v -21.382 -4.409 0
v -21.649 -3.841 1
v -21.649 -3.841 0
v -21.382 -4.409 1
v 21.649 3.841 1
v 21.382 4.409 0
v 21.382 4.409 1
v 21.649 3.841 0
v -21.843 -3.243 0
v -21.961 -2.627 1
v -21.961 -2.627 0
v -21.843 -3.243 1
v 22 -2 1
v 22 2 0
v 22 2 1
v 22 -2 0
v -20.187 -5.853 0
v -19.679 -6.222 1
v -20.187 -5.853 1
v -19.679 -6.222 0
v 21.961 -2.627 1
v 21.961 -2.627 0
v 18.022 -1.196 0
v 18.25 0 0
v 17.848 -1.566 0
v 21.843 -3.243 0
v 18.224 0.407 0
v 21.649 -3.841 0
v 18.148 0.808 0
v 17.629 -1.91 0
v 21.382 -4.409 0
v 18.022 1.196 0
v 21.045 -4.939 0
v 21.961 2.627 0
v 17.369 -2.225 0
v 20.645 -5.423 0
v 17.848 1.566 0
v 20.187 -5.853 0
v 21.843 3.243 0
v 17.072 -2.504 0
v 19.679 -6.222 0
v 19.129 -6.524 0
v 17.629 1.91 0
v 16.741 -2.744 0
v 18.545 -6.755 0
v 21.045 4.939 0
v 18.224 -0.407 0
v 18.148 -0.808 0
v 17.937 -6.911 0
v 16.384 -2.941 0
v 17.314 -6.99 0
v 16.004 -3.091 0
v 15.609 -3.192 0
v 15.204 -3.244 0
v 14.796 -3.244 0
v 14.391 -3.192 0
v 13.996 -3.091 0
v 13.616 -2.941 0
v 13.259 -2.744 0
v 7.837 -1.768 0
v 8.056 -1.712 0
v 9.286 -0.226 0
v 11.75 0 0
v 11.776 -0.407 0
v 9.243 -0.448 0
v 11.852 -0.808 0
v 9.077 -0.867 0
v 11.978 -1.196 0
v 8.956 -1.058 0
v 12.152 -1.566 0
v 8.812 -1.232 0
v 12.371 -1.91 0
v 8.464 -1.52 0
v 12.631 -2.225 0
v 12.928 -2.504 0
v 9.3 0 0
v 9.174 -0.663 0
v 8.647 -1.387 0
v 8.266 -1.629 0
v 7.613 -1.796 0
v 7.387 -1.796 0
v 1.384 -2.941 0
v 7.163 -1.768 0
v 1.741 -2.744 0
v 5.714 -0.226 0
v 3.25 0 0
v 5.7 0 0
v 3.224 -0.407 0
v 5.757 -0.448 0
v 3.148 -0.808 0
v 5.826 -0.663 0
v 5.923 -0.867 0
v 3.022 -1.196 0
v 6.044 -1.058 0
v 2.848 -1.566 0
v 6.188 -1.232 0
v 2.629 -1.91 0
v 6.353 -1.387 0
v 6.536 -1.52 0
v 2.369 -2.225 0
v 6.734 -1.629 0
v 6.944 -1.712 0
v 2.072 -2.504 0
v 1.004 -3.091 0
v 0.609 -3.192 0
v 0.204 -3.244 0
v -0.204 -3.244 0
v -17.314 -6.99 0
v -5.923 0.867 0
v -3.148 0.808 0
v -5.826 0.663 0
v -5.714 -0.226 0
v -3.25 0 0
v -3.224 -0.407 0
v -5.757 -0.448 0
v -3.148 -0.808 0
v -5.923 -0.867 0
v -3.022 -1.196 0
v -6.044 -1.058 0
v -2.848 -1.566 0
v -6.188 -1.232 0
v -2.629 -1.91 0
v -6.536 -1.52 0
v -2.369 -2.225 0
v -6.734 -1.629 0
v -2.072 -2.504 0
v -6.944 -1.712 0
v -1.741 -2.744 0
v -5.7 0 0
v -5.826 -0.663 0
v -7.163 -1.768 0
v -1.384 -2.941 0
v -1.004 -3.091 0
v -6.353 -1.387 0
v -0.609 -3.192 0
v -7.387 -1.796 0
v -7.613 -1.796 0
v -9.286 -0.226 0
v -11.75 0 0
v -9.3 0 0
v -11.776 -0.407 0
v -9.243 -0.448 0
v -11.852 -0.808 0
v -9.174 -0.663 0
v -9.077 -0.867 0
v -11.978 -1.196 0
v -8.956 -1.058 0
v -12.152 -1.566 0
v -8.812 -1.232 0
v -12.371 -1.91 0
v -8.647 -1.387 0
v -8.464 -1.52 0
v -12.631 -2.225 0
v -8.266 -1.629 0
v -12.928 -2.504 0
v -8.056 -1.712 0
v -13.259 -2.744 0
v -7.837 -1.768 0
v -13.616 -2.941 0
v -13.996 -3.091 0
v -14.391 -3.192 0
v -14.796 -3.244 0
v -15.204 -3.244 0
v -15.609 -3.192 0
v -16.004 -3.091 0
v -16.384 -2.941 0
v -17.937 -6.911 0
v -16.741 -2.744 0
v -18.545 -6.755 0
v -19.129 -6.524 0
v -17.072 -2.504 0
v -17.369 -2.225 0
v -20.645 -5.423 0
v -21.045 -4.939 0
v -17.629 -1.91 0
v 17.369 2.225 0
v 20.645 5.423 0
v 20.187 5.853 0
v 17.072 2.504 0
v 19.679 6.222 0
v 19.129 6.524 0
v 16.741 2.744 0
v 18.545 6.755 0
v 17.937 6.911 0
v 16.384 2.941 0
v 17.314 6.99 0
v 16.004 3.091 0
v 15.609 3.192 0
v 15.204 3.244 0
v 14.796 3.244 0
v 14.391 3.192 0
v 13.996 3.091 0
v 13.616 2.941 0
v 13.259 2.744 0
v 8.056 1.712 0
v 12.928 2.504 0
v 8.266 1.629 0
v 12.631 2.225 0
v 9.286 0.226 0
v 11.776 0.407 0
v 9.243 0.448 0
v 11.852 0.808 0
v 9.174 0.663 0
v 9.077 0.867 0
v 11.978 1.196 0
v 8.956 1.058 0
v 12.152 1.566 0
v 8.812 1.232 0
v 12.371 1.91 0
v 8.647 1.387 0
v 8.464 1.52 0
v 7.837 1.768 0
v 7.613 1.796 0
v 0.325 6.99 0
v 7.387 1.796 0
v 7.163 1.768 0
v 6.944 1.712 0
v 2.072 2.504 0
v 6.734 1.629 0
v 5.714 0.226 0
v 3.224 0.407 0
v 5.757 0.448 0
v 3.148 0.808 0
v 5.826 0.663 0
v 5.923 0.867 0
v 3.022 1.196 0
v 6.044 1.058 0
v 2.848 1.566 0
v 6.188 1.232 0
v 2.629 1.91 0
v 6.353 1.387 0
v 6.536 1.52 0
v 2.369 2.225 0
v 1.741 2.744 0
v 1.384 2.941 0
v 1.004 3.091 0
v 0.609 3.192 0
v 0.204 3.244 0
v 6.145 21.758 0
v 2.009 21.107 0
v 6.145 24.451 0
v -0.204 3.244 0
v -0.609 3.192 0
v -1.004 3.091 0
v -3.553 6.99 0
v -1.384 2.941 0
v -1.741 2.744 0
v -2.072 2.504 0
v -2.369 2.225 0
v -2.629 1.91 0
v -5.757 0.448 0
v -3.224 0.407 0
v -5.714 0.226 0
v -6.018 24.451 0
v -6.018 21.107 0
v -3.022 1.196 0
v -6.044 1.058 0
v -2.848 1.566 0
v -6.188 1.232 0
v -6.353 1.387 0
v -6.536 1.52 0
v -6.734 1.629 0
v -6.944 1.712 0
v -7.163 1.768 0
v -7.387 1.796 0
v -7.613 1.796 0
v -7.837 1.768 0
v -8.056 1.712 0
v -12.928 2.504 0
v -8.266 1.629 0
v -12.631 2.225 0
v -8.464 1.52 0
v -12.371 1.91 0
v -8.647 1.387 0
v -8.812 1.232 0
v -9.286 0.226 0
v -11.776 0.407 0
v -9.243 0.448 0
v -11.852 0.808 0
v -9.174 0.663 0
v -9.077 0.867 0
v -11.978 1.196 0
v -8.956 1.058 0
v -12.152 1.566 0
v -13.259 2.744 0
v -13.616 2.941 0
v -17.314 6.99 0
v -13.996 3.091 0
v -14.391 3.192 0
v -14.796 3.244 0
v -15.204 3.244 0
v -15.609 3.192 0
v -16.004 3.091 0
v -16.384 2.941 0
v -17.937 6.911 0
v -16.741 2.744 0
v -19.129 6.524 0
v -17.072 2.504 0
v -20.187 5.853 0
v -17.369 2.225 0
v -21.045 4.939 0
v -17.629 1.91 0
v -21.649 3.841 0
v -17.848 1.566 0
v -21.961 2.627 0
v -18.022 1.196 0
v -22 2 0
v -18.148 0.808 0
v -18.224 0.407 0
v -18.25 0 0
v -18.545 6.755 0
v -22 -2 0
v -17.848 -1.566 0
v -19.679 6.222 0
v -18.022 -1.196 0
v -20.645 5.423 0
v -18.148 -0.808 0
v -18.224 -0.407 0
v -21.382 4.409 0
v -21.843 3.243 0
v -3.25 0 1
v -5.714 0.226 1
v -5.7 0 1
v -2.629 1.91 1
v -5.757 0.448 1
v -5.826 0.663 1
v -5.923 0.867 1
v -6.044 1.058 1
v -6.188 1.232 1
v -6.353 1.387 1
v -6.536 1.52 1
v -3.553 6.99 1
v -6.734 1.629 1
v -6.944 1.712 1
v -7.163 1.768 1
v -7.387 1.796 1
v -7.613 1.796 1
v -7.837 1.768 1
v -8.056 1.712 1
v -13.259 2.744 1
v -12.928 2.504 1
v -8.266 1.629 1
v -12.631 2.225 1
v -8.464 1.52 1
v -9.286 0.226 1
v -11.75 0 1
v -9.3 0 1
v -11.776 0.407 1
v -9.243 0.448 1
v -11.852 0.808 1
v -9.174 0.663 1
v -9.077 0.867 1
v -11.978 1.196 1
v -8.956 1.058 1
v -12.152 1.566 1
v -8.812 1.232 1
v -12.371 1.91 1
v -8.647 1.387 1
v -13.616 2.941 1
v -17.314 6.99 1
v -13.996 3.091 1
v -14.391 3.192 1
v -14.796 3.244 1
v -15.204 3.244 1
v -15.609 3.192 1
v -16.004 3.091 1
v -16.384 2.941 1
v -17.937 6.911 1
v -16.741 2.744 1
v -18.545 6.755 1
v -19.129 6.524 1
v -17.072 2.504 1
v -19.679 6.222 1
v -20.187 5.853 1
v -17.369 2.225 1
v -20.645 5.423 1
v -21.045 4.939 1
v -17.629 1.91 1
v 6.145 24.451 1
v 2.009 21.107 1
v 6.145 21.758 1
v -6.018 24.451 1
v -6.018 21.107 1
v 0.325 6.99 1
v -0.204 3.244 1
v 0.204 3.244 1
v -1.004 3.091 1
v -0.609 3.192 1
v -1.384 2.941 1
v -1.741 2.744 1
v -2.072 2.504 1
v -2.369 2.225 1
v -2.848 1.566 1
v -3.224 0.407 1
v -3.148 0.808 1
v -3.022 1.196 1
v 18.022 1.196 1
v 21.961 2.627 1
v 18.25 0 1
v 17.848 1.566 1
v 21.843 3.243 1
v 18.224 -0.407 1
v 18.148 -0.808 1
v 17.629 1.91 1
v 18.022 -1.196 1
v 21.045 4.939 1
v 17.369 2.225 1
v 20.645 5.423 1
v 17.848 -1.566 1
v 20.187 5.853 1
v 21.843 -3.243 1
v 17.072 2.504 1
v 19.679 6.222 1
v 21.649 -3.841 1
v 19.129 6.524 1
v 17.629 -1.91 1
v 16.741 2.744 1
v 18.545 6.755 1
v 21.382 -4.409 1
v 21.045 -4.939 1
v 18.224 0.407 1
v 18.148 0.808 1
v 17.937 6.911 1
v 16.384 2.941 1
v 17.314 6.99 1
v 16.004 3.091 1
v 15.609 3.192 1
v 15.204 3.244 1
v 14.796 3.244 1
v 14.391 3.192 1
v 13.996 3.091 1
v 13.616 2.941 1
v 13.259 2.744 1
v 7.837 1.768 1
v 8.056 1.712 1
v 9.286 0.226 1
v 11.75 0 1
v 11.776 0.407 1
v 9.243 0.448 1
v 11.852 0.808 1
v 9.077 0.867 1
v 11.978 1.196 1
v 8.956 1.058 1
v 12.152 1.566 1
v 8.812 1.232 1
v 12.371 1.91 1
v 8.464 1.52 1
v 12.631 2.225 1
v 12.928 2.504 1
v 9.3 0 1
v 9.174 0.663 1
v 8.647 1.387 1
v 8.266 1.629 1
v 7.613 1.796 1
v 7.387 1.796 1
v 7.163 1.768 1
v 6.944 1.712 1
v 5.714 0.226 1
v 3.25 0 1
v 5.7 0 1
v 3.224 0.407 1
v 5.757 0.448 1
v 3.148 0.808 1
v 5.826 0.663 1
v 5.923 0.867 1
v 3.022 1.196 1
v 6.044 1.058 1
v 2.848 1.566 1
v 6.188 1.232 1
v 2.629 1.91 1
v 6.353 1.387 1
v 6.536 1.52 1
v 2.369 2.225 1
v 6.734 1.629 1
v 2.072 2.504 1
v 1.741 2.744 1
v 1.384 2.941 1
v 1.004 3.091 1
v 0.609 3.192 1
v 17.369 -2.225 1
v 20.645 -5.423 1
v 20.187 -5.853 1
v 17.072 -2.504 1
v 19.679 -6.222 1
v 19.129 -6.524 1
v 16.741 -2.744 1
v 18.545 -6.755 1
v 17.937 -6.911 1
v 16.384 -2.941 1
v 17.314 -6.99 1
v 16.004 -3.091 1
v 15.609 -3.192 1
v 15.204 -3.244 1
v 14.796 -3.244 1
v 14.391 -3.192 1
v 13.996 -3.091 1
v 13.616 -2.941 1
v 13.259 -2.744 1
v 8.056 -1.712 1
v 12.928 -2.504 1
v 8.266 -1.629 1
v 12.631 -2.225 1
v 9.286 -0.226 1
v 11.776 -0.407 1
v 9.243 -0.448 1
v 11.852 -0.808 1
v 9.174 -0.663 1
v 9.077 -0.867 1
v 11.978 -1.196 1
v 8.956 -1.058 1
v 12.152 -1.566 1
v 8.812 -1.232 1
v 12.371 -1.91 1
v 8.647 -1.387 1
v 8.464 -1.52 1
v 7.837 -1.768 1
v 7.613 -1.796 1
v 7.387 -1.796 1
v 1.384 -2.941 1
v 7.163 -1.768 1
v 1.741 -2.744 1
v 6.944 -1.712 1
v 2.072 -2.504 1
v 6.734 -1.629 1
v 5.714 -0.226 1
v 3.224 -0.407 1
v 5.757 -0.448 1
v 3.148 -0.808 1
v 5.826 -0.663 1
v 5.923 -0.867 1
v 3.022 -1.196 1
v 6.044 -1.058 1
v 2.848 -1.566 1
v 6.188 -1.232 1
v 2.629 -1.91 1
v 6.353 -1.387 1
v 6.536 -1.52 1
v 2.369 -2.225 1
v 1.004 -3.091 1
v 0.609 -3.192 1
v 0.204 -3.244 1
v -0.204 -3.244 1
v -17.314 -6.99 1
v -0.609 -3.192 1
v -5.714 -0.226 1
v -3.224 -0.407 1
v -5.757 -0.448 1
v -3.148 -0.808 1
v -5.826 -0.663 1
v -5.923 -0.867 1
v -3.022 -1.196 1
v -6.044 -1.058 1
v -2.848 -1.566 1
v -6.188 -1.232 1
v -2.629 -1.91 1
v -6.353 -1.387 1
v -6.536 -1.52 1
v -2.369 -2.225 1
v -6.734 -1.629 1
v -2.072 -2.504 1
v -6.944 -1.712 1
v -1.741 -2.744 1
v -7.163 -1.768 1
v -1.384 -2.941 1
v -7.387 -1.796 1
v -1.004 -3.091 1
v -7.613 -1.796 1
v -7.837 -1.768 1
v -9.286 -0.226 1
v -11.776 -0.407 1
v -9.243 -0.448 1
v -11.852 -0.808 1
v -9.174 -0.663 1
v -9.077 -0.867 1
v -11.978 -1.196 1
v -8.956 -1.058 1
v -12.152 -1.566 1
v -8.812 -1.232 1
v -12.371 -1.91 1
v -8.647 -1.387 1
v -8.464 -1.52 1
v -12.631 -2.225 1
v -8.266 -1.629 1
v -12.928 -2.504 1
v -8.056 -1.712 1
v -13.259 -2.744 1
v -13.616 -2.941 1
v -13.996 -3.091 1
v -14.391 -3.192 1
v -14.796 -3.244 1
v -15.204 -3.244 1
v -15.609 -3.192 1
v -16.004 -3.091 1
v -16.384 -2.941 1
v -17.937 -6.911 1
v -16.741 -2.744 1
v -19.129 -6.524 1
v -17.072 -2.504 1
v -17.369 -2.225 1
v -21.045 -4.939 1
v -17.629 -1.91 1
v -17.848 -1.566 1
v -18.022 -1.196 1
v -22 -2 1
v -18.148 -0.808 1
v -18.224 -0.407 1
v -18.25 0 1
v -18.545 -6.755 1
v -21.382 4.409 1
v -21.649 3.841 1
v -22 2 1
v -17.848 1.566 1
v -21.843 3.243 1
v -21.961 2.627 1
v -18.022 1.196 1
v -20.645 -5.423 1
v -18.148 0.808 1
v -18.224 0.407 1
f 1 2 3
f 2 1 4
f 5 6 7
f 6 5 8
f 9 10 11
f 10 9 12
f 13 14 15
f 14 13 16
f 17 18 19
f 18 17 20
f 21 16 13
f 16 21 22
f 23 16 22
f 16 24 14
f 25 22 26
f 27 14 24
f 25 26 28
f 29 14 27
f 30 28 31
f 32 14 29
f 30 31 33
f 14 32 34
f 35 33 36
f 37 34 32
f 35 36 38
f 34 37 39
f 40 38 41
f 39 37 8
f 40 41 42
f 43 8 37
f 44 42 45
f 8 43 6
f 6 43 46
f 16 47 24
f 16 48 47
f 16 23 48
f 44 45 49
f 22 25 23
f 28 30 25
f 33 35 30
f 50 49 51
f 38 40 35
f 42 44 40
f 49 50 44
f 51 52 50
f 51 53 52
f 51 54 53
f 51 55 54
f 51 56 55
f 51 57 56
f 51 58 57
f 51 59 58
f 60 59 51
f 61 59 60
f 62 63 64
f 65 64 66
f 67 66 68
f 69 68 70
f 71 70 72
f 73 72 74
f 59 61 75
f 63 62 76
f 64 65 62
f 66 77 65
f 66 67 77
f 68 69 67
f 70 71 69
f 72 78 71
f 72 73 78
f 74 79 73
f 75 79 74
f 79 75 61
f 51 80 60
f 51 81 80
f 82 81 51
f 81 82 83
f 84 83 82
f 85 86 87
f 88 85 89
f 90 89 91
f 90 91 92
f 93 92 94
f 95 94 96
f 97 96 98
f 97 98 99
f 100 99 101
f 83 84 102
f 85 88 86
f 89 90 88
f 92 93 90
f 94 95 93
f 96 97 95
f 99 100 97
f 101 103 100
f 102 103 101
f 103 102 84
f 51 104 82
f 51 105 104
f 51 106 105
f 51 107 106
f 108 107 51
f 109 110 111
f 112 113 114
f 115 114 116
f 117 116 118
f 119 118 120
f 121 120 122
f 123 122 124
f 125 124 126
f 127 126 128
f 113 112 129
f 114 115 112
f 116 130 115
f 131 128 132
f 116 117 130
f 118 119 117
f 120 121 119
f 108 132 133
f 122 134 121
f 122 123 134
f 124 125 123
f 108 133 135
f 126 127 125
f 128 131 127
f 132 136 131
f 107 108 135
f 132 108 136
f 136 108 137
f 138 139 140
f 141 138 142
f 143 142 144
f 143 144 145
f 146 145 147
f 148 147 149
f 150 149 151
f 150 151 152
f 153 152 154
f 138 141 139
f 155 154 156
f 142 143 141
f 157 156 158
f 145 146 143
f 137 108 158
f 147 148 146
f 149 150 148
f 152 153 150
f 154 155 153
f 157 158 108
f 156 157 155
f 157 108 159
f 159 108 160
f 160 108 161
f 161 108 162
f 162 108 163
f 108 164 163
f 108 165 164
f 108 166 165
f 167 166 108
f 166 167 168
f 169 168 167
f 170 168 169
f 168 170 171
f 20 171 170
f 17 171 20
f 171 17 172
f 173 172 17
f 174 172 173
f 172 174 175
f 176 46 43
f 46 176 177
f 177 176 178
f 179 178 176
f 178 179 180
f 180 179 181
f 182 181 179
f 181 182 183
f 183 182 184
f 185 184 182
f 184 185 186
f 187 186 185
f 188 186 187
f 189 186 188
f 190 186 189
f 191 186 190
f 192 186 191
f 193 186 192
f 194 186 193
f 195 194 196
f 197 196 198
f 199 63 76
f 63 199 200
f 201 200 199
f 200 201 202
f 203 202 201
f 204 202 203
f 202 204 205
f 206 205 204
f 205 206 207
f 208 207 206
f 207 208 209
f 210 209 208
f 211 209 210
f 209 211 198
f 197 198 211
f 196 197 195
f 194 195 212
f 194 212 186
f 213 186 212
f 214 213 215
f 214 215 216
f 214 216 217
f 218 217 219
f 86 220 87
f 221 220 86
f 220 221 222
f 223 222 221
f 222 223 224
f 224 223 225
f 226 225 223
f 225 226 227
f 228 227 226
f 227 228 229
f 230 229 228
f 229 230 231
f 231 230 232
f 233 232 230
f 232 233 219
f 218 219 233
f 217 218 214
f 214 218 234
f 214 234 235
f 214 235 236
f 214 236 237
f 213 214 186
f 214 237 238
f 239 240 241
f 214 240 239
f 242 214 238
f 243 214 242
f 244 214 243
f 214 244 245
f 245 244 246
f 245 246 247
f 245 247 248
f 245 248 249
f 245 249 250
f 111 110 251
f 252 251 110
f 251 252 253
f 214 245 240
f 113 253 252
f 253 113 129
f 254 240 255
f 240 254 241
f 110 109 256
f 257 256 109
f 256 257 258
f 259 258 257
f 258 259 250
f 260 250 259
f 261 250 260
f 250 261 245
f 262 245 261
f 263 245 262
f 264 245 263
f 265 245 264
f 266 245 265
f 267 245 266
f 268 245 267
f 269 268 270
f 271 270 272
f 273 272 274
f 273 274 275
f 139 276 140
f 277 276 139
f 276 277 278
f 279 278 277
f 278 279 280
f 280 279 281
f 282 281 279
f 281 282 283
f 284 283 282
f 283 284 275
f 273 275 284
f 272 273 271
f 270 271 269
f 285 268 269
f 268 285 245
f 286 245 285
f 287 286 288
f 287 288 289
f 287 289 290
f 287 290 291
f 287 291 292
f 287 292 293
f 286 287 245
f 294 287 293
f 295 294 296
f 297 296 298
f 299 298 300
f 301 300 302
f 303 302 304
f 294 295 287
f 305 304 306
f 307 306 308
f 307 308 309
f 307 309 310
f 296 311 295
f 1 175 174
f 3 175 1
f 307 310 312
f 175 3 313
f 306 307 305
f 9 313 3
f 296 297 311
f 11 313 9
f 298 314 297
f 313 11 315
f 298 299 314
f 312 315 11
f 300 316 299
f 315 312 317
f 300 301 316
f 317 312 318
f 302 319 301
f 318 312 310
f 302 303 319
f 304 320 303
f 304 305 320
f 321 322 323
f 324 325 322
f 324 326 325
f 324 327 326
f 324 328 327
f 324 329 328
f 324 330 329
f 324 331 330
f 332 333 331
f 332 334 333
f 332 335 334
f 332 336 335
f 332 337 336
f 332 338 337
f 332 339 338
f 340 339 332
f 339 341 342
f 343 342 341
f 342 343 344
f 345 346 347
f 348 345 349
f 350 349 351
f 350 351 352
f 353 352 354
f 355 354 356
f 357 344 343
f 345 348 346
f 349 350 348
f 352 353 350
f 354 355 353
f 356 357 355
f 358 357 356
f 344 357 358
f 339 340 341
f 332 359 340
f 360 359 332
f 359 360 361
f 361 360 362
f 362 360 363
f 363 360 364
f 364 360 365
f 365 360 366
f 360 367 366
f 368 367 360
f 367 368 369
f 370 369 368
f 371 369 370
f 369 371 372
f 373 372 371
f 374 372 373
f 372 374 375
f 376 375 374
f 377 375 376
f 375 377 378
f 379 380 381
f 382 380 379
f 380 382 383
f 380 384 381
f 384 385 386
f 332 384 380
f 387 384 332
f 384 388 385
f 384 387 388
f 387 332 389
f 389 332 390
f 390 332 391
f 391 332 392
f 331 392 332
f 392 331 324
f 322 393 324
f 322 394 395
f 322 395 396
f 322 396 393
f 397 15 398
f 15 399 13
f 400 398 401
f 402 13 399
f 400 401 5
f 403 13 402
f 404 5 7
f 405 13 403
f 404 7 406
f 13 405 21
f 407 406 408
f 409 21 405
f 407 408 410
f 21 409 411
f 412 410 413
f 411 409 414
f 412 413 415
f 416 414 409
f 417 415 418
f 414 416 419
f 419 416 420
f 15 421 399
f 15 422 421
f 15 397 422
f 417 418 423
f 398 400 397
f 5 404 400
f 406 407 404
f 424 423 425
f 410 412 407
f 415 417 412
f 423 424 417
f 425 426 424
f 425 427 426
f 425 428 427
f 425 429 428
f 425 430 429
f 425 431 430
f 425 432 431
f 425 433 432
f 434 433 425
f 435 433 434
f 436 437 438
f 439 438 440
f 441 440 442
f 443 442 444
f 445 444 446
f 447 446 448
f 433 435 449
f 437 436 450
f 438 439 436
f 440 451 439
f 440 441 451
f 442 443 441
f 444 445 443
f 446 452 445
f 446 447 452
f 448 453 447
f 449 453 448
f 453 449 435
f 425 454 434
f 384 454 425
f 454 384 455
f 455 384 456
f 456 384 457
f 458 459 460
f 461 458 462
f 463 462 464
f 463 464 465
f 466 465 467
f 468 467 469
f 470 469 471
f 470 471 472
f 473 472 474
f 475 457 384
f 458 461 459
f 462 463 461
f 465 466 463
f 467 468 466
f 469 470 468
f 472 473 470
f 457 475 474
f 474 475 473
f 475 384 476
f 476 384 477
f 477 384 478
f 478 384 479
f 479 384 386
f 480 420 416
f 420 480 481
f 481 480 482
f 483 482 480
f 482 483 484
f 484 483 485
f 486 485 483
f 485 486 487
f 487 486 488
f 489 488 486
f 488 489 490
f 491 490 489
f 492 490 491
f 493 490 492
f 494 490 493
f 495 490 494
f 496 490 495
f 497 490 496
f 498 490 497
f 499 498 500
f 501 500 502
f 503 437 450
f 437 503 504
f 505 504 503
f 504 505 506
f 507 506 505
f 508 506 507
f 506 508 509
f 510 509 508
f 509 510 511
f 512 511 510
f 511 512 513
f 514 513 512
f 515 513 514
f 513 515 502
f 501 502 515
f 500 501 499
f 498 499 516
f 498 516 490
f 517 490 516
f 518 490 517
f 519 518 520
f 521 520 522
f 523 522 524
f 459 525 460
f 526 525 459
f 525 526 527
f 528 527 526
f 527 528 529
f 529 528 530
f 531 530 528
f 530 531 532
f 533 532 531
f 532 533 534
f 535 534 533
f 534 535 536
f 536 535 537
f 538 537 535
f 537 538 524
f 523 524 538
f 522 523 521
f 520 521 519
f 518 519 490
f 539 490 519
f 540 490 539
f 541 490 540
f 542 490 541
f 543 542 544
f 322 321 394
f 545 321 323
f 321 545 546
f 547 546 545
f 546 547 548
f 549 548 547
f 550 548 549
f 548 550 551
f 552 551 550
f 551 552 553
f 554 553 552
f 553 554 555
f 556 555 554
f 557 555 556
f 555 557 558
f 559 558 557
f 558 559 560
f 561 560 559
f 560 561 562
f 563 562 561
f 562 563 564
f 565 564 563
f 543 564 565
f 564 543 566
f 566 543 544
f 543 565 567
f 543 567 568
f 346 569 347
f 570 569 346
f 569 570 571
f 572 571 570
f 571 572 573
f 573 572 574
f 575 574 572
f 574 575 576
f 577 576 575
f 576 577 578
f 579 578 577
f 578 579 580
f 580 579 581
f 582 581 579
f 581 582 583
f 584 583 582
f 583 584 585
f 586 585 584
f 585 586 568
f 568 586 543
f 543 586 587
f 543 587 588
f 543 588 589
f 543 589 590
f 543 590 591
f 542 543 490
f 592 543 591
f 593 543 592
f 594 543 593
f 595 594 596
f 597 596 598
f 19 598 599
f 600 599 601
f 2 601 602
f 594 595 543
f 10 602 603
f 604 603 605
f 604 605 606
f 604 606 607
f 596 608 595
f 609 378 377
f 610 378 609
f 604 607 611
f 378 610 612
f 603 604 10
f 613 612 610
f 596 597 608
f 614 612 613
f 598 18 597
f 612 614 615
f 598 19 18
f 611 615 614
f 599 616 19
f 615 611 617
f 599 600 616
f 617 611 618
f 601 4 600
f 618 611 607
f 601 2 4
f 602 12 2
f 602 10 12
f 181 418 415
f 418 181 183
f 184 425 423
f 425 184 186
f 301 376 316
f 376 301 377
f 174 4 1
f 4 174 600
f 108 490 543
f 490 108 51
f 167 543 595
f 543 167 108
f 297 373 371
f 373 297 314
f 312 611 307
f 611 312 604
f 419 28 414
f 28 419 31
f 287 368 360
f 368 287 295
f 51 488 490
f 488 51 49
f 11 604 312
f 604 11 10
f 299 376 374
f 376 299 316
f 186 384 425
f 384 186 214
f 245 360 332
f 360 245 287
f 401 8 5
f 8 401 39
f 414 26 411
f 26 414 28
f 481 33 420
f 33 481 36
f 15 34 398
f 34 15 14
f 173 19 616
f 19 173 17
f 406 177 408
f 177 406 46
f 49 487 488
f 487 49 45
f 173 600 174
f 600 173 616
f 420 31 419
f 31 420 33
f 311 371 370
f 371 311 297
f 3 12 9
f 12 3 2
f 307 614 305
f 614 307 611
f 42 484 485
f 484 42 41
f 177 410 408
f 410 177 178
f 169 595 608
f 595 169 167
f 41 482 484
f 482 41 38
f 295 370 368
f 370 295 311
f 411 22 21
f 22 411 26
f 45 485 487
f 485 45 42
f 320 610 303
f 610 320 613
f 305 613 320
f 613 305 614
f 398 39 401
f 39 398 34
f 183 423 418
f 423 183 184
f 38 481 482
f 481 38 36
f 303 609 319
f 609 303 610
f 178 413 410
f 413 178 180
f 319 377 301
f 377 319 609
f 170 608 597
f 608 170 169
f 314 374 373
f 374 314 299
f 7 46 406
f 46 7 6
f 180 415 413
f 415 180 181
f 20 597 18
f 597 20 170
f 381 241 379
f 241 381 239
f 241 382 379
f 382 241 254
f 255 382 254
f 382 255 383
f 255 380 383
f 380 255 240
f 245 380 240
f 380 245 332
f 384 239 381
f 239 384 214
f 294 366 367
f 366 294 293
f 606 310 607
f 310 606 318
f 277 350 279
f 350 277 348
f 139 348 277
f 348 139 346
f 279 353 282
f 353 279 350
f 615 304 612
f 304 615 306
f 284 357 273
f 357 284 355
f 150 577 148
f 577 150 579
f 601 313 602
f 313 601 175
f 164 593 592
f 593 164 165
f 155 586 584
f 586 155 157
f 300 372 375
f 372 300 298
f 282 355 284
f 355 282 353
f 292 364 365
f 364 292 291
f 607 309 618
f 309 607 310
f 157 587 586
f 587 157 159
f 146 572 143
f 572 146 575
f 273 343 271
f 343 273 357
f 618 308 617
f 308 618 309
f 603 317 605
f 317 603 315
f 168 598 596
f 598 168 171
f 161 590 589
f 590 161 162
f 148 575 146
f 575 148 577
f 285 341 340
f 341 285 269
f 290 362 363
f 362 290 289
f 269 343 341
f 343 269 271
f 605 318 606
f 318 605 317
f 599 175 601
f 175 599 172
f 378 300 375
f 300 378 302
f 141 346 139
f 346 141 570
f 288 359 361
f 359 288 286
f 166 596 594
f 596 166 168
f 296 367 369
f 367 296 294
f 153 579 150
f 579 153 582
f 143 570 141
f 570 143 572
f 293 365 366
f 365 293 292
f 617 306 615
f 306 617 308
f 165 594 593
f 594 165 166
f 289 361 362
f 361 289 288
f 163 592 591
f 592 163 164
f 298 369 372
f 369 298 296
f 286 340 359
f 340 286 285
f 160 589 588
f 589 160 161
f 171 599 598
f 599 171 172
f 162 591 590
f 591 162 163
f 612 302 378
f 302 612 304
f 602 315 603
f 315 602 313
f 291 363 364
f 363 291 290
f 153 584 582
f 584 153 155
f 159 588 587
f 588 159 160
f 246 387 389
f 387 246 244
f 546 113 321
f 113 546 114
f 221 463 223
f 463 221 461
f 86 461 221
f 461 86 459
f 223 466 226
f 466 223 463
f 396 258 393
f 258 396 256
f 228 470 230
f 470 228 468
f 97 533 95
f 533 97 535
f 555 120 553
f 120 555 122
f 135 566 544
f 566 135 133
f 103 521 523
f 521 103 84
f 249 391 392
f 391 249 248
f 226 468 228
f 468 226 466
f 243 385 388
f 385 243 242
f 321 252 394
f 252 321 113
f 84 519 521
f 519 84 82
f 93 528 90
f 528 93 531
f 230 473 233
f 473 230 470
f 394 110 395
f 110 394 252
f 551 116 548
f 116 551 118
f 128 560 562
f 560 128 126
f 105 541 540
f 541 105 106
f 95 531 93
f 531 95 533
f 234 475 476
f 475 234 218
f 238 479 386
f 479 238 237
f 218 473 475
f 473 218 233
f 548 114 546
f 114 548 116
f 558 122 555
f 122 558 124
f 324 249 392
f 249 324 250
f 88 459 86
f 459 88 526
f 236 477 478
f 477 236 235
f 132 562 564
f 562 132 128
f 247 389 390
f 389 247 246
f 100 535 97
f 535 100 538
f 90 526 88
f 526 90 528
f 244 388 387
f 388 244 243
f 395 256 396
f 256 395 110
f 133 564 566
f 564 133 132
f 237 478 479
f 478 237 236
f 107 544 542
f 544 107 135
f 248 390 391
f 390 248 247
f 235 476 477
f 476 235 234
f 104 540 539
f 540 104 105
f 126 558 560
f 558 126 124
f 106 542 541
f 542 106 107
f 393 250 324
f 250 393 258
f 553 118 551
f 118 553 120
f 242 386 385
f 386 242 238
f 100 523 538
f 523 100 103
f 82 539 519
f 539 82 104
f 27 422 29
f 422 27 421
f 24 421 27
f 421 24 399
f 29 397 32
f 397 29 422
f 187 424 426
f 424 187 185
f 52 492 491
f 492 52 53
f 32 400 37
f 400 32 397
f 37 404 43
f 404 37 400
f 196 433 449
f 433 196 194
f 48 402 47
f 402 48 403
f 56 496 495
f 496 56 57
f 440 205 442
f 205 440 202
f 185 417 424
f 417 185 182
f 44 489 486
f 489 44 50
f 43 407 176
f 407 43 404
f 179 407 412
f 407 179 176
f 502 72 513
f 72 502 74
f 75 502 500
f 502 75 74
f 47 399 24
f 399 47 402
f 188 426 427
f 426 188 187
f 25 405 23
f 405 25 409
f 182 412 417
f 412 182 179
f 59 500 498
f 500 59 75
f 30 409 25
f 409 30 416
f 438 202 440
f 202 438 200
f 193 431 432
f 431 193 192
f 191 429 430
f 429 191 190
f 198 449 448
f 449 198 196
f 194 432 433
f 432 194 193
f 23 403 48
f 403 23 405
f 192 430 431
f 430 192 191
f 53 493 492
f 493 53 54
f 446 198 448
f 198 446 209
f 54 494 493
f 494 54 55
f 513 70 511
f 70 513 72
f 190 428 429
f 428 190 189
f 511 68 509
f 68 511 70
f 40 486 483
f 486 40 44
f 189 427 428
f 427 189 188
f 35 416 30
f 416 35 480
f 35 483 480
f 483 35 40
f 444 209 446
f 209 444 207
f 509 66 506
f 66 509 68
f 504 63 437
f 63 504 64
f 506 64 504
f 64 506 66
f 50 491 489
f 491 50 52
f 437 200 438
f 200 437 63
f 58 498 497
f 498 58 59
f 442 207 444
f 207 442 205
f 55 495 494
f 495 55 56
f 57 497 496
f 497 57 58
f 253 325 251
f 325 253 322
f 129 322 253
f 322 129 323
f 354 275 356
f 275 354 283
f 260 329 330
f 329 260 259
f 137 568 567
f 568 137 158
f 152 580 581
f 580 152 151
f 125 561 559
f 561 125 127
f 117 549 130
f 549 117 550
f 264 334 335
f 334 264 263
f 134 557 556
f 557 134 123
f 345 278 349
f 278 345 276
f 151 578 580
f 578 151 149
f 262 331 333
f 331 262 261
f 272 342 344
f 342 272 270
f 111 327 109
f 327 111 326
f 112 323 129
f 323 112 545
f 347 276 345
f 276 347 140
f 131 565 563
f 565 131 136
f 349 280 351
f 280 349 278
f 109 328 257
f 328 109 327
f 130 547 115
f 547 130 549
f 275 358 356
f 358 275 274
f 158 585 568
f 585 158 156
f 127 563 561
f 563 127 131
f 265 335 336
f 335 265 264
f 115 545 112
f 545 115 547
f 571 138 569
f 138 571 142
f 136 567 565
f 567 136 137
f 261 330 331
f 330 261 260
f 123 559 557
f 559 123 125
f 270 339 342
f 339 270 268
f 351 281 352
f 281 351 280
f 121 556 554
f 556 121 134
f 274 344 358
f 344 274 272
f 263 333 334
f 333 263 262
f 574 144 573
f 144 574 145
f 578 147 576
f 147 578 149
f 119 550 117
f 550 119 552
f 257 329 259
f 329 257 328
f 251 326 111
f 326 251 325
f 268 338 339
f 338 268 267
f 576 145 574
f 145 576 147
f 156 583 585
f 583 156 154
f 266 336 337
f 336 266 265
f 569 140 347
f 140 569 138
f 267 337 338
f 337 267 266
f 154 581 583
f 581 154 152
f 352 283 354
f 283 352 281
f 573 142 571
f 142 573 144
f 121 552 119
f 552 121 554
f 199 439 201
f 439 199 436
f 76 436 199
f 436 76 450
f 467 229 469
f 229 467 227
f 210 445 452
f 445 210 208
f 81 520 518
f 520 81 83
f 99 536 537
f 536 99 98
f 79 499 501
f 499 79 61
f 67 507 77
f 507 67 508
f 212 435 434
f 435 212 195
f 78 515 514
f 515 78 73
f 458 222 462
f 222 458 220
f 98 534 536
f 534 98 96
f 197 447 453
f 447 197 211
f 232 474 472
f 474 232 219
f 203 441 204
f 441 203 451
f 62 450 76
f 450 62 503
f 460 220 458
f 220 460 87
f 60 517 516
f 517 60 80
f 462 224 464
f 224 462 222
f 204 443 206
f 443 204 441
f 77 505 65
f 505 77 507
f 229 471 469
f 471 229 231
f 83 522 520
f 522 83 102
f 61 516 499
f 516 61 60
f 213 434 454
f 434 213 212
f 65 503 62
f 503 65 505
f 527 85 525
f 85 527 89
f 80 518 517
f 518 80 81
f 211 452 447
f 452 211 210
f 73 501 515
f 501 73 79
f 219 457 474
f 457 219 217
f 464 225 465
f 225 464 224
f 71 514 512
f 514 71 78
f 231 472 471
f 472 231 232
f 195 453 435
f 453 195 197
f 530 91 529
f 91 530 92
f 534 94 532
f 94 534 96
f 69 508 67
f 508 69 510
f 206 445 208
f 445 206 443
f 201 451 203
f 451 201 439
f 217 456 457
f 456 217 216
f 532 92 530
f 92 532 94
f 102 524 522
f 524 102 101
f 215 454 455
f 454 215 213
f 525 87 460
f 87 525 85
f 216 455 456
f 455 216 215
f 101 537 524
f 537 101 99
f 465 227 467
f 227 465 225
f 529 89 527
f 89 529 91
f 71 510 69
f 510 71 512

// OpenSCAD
$fn = 50;


difference() {
	union() {
		hull() {
			translate(v = [-17.0000000000, 2.0000000000, 0]) {
				cylinder(h = 1, r = 5);
			}
			translate(v = [17.0000000000, 2.0000000000, 0]) {
				cylinder(h = 1, r = 5);
			}
			translate(v = [-17.0000000000, -2.0000000000, 0]) {
				cylinder(h = 1, r = 5);
			}
			translate(v = [17.0000000000, -2.0000000000, 0]) {
				cylinder(h = 1, r = 5);
			}
		}
		translate(v = [0, 24, 0]) {
			linear_extrude(height = 1) {
				text(font = "DejaVu Sans Mono:style=Bold", halign = "center", size = 19.0000000000, text = "7", valign = "top");
			}
		}
	}
	union() {
		translate(v = [-15.0000000000, 0.0000000000, 0]) {
			translate(v = [0, 0, -100]) {
				cylinder(h = 200, r = 3.2500000000);
			}
		}
		translate(v = [0, 0, -100]) {
			cylinder(h = 200, r = 3.2500000000);
		}
		translate(v = [15.0000000000, 0.0000000000, 0]) {
			translate(v = [0, 0, -100]) {
				cylinder(h = 200, r = 3.2500000000);
			}
		}
		translate(v = [-15.0000000000, 0.0000000000, 0]) {
			translate(v = [0, 0, -100]) {
				cylinder(h = 200, r = 1.8000000000);
			}
		}
		translate(v = [-7.5000000000, 0.0000000000, 0]) {
			translate(v = [0, 0, -100]) {
				cylinder(h = 200, r = 1.8000000000);
			}
		}
		translate(v = [0, 0, -100]) {
			cylinder(h = 200, r = 1.8000000000);
		}
		translate(v = [7.5000000000, 0.0000000000, 0]) {
			translate(v = [0, 0, -100]) {
				cylinder(h = 200, r = 1.8000000000);
			}
		}
		translate(v = [15.0000000000, 0.0000000000, 0]) {
			translate(v = [0, 0, -100]) {
				cylinder(h = 200, r = 1.8000000000);
			}
		}
	}
}
